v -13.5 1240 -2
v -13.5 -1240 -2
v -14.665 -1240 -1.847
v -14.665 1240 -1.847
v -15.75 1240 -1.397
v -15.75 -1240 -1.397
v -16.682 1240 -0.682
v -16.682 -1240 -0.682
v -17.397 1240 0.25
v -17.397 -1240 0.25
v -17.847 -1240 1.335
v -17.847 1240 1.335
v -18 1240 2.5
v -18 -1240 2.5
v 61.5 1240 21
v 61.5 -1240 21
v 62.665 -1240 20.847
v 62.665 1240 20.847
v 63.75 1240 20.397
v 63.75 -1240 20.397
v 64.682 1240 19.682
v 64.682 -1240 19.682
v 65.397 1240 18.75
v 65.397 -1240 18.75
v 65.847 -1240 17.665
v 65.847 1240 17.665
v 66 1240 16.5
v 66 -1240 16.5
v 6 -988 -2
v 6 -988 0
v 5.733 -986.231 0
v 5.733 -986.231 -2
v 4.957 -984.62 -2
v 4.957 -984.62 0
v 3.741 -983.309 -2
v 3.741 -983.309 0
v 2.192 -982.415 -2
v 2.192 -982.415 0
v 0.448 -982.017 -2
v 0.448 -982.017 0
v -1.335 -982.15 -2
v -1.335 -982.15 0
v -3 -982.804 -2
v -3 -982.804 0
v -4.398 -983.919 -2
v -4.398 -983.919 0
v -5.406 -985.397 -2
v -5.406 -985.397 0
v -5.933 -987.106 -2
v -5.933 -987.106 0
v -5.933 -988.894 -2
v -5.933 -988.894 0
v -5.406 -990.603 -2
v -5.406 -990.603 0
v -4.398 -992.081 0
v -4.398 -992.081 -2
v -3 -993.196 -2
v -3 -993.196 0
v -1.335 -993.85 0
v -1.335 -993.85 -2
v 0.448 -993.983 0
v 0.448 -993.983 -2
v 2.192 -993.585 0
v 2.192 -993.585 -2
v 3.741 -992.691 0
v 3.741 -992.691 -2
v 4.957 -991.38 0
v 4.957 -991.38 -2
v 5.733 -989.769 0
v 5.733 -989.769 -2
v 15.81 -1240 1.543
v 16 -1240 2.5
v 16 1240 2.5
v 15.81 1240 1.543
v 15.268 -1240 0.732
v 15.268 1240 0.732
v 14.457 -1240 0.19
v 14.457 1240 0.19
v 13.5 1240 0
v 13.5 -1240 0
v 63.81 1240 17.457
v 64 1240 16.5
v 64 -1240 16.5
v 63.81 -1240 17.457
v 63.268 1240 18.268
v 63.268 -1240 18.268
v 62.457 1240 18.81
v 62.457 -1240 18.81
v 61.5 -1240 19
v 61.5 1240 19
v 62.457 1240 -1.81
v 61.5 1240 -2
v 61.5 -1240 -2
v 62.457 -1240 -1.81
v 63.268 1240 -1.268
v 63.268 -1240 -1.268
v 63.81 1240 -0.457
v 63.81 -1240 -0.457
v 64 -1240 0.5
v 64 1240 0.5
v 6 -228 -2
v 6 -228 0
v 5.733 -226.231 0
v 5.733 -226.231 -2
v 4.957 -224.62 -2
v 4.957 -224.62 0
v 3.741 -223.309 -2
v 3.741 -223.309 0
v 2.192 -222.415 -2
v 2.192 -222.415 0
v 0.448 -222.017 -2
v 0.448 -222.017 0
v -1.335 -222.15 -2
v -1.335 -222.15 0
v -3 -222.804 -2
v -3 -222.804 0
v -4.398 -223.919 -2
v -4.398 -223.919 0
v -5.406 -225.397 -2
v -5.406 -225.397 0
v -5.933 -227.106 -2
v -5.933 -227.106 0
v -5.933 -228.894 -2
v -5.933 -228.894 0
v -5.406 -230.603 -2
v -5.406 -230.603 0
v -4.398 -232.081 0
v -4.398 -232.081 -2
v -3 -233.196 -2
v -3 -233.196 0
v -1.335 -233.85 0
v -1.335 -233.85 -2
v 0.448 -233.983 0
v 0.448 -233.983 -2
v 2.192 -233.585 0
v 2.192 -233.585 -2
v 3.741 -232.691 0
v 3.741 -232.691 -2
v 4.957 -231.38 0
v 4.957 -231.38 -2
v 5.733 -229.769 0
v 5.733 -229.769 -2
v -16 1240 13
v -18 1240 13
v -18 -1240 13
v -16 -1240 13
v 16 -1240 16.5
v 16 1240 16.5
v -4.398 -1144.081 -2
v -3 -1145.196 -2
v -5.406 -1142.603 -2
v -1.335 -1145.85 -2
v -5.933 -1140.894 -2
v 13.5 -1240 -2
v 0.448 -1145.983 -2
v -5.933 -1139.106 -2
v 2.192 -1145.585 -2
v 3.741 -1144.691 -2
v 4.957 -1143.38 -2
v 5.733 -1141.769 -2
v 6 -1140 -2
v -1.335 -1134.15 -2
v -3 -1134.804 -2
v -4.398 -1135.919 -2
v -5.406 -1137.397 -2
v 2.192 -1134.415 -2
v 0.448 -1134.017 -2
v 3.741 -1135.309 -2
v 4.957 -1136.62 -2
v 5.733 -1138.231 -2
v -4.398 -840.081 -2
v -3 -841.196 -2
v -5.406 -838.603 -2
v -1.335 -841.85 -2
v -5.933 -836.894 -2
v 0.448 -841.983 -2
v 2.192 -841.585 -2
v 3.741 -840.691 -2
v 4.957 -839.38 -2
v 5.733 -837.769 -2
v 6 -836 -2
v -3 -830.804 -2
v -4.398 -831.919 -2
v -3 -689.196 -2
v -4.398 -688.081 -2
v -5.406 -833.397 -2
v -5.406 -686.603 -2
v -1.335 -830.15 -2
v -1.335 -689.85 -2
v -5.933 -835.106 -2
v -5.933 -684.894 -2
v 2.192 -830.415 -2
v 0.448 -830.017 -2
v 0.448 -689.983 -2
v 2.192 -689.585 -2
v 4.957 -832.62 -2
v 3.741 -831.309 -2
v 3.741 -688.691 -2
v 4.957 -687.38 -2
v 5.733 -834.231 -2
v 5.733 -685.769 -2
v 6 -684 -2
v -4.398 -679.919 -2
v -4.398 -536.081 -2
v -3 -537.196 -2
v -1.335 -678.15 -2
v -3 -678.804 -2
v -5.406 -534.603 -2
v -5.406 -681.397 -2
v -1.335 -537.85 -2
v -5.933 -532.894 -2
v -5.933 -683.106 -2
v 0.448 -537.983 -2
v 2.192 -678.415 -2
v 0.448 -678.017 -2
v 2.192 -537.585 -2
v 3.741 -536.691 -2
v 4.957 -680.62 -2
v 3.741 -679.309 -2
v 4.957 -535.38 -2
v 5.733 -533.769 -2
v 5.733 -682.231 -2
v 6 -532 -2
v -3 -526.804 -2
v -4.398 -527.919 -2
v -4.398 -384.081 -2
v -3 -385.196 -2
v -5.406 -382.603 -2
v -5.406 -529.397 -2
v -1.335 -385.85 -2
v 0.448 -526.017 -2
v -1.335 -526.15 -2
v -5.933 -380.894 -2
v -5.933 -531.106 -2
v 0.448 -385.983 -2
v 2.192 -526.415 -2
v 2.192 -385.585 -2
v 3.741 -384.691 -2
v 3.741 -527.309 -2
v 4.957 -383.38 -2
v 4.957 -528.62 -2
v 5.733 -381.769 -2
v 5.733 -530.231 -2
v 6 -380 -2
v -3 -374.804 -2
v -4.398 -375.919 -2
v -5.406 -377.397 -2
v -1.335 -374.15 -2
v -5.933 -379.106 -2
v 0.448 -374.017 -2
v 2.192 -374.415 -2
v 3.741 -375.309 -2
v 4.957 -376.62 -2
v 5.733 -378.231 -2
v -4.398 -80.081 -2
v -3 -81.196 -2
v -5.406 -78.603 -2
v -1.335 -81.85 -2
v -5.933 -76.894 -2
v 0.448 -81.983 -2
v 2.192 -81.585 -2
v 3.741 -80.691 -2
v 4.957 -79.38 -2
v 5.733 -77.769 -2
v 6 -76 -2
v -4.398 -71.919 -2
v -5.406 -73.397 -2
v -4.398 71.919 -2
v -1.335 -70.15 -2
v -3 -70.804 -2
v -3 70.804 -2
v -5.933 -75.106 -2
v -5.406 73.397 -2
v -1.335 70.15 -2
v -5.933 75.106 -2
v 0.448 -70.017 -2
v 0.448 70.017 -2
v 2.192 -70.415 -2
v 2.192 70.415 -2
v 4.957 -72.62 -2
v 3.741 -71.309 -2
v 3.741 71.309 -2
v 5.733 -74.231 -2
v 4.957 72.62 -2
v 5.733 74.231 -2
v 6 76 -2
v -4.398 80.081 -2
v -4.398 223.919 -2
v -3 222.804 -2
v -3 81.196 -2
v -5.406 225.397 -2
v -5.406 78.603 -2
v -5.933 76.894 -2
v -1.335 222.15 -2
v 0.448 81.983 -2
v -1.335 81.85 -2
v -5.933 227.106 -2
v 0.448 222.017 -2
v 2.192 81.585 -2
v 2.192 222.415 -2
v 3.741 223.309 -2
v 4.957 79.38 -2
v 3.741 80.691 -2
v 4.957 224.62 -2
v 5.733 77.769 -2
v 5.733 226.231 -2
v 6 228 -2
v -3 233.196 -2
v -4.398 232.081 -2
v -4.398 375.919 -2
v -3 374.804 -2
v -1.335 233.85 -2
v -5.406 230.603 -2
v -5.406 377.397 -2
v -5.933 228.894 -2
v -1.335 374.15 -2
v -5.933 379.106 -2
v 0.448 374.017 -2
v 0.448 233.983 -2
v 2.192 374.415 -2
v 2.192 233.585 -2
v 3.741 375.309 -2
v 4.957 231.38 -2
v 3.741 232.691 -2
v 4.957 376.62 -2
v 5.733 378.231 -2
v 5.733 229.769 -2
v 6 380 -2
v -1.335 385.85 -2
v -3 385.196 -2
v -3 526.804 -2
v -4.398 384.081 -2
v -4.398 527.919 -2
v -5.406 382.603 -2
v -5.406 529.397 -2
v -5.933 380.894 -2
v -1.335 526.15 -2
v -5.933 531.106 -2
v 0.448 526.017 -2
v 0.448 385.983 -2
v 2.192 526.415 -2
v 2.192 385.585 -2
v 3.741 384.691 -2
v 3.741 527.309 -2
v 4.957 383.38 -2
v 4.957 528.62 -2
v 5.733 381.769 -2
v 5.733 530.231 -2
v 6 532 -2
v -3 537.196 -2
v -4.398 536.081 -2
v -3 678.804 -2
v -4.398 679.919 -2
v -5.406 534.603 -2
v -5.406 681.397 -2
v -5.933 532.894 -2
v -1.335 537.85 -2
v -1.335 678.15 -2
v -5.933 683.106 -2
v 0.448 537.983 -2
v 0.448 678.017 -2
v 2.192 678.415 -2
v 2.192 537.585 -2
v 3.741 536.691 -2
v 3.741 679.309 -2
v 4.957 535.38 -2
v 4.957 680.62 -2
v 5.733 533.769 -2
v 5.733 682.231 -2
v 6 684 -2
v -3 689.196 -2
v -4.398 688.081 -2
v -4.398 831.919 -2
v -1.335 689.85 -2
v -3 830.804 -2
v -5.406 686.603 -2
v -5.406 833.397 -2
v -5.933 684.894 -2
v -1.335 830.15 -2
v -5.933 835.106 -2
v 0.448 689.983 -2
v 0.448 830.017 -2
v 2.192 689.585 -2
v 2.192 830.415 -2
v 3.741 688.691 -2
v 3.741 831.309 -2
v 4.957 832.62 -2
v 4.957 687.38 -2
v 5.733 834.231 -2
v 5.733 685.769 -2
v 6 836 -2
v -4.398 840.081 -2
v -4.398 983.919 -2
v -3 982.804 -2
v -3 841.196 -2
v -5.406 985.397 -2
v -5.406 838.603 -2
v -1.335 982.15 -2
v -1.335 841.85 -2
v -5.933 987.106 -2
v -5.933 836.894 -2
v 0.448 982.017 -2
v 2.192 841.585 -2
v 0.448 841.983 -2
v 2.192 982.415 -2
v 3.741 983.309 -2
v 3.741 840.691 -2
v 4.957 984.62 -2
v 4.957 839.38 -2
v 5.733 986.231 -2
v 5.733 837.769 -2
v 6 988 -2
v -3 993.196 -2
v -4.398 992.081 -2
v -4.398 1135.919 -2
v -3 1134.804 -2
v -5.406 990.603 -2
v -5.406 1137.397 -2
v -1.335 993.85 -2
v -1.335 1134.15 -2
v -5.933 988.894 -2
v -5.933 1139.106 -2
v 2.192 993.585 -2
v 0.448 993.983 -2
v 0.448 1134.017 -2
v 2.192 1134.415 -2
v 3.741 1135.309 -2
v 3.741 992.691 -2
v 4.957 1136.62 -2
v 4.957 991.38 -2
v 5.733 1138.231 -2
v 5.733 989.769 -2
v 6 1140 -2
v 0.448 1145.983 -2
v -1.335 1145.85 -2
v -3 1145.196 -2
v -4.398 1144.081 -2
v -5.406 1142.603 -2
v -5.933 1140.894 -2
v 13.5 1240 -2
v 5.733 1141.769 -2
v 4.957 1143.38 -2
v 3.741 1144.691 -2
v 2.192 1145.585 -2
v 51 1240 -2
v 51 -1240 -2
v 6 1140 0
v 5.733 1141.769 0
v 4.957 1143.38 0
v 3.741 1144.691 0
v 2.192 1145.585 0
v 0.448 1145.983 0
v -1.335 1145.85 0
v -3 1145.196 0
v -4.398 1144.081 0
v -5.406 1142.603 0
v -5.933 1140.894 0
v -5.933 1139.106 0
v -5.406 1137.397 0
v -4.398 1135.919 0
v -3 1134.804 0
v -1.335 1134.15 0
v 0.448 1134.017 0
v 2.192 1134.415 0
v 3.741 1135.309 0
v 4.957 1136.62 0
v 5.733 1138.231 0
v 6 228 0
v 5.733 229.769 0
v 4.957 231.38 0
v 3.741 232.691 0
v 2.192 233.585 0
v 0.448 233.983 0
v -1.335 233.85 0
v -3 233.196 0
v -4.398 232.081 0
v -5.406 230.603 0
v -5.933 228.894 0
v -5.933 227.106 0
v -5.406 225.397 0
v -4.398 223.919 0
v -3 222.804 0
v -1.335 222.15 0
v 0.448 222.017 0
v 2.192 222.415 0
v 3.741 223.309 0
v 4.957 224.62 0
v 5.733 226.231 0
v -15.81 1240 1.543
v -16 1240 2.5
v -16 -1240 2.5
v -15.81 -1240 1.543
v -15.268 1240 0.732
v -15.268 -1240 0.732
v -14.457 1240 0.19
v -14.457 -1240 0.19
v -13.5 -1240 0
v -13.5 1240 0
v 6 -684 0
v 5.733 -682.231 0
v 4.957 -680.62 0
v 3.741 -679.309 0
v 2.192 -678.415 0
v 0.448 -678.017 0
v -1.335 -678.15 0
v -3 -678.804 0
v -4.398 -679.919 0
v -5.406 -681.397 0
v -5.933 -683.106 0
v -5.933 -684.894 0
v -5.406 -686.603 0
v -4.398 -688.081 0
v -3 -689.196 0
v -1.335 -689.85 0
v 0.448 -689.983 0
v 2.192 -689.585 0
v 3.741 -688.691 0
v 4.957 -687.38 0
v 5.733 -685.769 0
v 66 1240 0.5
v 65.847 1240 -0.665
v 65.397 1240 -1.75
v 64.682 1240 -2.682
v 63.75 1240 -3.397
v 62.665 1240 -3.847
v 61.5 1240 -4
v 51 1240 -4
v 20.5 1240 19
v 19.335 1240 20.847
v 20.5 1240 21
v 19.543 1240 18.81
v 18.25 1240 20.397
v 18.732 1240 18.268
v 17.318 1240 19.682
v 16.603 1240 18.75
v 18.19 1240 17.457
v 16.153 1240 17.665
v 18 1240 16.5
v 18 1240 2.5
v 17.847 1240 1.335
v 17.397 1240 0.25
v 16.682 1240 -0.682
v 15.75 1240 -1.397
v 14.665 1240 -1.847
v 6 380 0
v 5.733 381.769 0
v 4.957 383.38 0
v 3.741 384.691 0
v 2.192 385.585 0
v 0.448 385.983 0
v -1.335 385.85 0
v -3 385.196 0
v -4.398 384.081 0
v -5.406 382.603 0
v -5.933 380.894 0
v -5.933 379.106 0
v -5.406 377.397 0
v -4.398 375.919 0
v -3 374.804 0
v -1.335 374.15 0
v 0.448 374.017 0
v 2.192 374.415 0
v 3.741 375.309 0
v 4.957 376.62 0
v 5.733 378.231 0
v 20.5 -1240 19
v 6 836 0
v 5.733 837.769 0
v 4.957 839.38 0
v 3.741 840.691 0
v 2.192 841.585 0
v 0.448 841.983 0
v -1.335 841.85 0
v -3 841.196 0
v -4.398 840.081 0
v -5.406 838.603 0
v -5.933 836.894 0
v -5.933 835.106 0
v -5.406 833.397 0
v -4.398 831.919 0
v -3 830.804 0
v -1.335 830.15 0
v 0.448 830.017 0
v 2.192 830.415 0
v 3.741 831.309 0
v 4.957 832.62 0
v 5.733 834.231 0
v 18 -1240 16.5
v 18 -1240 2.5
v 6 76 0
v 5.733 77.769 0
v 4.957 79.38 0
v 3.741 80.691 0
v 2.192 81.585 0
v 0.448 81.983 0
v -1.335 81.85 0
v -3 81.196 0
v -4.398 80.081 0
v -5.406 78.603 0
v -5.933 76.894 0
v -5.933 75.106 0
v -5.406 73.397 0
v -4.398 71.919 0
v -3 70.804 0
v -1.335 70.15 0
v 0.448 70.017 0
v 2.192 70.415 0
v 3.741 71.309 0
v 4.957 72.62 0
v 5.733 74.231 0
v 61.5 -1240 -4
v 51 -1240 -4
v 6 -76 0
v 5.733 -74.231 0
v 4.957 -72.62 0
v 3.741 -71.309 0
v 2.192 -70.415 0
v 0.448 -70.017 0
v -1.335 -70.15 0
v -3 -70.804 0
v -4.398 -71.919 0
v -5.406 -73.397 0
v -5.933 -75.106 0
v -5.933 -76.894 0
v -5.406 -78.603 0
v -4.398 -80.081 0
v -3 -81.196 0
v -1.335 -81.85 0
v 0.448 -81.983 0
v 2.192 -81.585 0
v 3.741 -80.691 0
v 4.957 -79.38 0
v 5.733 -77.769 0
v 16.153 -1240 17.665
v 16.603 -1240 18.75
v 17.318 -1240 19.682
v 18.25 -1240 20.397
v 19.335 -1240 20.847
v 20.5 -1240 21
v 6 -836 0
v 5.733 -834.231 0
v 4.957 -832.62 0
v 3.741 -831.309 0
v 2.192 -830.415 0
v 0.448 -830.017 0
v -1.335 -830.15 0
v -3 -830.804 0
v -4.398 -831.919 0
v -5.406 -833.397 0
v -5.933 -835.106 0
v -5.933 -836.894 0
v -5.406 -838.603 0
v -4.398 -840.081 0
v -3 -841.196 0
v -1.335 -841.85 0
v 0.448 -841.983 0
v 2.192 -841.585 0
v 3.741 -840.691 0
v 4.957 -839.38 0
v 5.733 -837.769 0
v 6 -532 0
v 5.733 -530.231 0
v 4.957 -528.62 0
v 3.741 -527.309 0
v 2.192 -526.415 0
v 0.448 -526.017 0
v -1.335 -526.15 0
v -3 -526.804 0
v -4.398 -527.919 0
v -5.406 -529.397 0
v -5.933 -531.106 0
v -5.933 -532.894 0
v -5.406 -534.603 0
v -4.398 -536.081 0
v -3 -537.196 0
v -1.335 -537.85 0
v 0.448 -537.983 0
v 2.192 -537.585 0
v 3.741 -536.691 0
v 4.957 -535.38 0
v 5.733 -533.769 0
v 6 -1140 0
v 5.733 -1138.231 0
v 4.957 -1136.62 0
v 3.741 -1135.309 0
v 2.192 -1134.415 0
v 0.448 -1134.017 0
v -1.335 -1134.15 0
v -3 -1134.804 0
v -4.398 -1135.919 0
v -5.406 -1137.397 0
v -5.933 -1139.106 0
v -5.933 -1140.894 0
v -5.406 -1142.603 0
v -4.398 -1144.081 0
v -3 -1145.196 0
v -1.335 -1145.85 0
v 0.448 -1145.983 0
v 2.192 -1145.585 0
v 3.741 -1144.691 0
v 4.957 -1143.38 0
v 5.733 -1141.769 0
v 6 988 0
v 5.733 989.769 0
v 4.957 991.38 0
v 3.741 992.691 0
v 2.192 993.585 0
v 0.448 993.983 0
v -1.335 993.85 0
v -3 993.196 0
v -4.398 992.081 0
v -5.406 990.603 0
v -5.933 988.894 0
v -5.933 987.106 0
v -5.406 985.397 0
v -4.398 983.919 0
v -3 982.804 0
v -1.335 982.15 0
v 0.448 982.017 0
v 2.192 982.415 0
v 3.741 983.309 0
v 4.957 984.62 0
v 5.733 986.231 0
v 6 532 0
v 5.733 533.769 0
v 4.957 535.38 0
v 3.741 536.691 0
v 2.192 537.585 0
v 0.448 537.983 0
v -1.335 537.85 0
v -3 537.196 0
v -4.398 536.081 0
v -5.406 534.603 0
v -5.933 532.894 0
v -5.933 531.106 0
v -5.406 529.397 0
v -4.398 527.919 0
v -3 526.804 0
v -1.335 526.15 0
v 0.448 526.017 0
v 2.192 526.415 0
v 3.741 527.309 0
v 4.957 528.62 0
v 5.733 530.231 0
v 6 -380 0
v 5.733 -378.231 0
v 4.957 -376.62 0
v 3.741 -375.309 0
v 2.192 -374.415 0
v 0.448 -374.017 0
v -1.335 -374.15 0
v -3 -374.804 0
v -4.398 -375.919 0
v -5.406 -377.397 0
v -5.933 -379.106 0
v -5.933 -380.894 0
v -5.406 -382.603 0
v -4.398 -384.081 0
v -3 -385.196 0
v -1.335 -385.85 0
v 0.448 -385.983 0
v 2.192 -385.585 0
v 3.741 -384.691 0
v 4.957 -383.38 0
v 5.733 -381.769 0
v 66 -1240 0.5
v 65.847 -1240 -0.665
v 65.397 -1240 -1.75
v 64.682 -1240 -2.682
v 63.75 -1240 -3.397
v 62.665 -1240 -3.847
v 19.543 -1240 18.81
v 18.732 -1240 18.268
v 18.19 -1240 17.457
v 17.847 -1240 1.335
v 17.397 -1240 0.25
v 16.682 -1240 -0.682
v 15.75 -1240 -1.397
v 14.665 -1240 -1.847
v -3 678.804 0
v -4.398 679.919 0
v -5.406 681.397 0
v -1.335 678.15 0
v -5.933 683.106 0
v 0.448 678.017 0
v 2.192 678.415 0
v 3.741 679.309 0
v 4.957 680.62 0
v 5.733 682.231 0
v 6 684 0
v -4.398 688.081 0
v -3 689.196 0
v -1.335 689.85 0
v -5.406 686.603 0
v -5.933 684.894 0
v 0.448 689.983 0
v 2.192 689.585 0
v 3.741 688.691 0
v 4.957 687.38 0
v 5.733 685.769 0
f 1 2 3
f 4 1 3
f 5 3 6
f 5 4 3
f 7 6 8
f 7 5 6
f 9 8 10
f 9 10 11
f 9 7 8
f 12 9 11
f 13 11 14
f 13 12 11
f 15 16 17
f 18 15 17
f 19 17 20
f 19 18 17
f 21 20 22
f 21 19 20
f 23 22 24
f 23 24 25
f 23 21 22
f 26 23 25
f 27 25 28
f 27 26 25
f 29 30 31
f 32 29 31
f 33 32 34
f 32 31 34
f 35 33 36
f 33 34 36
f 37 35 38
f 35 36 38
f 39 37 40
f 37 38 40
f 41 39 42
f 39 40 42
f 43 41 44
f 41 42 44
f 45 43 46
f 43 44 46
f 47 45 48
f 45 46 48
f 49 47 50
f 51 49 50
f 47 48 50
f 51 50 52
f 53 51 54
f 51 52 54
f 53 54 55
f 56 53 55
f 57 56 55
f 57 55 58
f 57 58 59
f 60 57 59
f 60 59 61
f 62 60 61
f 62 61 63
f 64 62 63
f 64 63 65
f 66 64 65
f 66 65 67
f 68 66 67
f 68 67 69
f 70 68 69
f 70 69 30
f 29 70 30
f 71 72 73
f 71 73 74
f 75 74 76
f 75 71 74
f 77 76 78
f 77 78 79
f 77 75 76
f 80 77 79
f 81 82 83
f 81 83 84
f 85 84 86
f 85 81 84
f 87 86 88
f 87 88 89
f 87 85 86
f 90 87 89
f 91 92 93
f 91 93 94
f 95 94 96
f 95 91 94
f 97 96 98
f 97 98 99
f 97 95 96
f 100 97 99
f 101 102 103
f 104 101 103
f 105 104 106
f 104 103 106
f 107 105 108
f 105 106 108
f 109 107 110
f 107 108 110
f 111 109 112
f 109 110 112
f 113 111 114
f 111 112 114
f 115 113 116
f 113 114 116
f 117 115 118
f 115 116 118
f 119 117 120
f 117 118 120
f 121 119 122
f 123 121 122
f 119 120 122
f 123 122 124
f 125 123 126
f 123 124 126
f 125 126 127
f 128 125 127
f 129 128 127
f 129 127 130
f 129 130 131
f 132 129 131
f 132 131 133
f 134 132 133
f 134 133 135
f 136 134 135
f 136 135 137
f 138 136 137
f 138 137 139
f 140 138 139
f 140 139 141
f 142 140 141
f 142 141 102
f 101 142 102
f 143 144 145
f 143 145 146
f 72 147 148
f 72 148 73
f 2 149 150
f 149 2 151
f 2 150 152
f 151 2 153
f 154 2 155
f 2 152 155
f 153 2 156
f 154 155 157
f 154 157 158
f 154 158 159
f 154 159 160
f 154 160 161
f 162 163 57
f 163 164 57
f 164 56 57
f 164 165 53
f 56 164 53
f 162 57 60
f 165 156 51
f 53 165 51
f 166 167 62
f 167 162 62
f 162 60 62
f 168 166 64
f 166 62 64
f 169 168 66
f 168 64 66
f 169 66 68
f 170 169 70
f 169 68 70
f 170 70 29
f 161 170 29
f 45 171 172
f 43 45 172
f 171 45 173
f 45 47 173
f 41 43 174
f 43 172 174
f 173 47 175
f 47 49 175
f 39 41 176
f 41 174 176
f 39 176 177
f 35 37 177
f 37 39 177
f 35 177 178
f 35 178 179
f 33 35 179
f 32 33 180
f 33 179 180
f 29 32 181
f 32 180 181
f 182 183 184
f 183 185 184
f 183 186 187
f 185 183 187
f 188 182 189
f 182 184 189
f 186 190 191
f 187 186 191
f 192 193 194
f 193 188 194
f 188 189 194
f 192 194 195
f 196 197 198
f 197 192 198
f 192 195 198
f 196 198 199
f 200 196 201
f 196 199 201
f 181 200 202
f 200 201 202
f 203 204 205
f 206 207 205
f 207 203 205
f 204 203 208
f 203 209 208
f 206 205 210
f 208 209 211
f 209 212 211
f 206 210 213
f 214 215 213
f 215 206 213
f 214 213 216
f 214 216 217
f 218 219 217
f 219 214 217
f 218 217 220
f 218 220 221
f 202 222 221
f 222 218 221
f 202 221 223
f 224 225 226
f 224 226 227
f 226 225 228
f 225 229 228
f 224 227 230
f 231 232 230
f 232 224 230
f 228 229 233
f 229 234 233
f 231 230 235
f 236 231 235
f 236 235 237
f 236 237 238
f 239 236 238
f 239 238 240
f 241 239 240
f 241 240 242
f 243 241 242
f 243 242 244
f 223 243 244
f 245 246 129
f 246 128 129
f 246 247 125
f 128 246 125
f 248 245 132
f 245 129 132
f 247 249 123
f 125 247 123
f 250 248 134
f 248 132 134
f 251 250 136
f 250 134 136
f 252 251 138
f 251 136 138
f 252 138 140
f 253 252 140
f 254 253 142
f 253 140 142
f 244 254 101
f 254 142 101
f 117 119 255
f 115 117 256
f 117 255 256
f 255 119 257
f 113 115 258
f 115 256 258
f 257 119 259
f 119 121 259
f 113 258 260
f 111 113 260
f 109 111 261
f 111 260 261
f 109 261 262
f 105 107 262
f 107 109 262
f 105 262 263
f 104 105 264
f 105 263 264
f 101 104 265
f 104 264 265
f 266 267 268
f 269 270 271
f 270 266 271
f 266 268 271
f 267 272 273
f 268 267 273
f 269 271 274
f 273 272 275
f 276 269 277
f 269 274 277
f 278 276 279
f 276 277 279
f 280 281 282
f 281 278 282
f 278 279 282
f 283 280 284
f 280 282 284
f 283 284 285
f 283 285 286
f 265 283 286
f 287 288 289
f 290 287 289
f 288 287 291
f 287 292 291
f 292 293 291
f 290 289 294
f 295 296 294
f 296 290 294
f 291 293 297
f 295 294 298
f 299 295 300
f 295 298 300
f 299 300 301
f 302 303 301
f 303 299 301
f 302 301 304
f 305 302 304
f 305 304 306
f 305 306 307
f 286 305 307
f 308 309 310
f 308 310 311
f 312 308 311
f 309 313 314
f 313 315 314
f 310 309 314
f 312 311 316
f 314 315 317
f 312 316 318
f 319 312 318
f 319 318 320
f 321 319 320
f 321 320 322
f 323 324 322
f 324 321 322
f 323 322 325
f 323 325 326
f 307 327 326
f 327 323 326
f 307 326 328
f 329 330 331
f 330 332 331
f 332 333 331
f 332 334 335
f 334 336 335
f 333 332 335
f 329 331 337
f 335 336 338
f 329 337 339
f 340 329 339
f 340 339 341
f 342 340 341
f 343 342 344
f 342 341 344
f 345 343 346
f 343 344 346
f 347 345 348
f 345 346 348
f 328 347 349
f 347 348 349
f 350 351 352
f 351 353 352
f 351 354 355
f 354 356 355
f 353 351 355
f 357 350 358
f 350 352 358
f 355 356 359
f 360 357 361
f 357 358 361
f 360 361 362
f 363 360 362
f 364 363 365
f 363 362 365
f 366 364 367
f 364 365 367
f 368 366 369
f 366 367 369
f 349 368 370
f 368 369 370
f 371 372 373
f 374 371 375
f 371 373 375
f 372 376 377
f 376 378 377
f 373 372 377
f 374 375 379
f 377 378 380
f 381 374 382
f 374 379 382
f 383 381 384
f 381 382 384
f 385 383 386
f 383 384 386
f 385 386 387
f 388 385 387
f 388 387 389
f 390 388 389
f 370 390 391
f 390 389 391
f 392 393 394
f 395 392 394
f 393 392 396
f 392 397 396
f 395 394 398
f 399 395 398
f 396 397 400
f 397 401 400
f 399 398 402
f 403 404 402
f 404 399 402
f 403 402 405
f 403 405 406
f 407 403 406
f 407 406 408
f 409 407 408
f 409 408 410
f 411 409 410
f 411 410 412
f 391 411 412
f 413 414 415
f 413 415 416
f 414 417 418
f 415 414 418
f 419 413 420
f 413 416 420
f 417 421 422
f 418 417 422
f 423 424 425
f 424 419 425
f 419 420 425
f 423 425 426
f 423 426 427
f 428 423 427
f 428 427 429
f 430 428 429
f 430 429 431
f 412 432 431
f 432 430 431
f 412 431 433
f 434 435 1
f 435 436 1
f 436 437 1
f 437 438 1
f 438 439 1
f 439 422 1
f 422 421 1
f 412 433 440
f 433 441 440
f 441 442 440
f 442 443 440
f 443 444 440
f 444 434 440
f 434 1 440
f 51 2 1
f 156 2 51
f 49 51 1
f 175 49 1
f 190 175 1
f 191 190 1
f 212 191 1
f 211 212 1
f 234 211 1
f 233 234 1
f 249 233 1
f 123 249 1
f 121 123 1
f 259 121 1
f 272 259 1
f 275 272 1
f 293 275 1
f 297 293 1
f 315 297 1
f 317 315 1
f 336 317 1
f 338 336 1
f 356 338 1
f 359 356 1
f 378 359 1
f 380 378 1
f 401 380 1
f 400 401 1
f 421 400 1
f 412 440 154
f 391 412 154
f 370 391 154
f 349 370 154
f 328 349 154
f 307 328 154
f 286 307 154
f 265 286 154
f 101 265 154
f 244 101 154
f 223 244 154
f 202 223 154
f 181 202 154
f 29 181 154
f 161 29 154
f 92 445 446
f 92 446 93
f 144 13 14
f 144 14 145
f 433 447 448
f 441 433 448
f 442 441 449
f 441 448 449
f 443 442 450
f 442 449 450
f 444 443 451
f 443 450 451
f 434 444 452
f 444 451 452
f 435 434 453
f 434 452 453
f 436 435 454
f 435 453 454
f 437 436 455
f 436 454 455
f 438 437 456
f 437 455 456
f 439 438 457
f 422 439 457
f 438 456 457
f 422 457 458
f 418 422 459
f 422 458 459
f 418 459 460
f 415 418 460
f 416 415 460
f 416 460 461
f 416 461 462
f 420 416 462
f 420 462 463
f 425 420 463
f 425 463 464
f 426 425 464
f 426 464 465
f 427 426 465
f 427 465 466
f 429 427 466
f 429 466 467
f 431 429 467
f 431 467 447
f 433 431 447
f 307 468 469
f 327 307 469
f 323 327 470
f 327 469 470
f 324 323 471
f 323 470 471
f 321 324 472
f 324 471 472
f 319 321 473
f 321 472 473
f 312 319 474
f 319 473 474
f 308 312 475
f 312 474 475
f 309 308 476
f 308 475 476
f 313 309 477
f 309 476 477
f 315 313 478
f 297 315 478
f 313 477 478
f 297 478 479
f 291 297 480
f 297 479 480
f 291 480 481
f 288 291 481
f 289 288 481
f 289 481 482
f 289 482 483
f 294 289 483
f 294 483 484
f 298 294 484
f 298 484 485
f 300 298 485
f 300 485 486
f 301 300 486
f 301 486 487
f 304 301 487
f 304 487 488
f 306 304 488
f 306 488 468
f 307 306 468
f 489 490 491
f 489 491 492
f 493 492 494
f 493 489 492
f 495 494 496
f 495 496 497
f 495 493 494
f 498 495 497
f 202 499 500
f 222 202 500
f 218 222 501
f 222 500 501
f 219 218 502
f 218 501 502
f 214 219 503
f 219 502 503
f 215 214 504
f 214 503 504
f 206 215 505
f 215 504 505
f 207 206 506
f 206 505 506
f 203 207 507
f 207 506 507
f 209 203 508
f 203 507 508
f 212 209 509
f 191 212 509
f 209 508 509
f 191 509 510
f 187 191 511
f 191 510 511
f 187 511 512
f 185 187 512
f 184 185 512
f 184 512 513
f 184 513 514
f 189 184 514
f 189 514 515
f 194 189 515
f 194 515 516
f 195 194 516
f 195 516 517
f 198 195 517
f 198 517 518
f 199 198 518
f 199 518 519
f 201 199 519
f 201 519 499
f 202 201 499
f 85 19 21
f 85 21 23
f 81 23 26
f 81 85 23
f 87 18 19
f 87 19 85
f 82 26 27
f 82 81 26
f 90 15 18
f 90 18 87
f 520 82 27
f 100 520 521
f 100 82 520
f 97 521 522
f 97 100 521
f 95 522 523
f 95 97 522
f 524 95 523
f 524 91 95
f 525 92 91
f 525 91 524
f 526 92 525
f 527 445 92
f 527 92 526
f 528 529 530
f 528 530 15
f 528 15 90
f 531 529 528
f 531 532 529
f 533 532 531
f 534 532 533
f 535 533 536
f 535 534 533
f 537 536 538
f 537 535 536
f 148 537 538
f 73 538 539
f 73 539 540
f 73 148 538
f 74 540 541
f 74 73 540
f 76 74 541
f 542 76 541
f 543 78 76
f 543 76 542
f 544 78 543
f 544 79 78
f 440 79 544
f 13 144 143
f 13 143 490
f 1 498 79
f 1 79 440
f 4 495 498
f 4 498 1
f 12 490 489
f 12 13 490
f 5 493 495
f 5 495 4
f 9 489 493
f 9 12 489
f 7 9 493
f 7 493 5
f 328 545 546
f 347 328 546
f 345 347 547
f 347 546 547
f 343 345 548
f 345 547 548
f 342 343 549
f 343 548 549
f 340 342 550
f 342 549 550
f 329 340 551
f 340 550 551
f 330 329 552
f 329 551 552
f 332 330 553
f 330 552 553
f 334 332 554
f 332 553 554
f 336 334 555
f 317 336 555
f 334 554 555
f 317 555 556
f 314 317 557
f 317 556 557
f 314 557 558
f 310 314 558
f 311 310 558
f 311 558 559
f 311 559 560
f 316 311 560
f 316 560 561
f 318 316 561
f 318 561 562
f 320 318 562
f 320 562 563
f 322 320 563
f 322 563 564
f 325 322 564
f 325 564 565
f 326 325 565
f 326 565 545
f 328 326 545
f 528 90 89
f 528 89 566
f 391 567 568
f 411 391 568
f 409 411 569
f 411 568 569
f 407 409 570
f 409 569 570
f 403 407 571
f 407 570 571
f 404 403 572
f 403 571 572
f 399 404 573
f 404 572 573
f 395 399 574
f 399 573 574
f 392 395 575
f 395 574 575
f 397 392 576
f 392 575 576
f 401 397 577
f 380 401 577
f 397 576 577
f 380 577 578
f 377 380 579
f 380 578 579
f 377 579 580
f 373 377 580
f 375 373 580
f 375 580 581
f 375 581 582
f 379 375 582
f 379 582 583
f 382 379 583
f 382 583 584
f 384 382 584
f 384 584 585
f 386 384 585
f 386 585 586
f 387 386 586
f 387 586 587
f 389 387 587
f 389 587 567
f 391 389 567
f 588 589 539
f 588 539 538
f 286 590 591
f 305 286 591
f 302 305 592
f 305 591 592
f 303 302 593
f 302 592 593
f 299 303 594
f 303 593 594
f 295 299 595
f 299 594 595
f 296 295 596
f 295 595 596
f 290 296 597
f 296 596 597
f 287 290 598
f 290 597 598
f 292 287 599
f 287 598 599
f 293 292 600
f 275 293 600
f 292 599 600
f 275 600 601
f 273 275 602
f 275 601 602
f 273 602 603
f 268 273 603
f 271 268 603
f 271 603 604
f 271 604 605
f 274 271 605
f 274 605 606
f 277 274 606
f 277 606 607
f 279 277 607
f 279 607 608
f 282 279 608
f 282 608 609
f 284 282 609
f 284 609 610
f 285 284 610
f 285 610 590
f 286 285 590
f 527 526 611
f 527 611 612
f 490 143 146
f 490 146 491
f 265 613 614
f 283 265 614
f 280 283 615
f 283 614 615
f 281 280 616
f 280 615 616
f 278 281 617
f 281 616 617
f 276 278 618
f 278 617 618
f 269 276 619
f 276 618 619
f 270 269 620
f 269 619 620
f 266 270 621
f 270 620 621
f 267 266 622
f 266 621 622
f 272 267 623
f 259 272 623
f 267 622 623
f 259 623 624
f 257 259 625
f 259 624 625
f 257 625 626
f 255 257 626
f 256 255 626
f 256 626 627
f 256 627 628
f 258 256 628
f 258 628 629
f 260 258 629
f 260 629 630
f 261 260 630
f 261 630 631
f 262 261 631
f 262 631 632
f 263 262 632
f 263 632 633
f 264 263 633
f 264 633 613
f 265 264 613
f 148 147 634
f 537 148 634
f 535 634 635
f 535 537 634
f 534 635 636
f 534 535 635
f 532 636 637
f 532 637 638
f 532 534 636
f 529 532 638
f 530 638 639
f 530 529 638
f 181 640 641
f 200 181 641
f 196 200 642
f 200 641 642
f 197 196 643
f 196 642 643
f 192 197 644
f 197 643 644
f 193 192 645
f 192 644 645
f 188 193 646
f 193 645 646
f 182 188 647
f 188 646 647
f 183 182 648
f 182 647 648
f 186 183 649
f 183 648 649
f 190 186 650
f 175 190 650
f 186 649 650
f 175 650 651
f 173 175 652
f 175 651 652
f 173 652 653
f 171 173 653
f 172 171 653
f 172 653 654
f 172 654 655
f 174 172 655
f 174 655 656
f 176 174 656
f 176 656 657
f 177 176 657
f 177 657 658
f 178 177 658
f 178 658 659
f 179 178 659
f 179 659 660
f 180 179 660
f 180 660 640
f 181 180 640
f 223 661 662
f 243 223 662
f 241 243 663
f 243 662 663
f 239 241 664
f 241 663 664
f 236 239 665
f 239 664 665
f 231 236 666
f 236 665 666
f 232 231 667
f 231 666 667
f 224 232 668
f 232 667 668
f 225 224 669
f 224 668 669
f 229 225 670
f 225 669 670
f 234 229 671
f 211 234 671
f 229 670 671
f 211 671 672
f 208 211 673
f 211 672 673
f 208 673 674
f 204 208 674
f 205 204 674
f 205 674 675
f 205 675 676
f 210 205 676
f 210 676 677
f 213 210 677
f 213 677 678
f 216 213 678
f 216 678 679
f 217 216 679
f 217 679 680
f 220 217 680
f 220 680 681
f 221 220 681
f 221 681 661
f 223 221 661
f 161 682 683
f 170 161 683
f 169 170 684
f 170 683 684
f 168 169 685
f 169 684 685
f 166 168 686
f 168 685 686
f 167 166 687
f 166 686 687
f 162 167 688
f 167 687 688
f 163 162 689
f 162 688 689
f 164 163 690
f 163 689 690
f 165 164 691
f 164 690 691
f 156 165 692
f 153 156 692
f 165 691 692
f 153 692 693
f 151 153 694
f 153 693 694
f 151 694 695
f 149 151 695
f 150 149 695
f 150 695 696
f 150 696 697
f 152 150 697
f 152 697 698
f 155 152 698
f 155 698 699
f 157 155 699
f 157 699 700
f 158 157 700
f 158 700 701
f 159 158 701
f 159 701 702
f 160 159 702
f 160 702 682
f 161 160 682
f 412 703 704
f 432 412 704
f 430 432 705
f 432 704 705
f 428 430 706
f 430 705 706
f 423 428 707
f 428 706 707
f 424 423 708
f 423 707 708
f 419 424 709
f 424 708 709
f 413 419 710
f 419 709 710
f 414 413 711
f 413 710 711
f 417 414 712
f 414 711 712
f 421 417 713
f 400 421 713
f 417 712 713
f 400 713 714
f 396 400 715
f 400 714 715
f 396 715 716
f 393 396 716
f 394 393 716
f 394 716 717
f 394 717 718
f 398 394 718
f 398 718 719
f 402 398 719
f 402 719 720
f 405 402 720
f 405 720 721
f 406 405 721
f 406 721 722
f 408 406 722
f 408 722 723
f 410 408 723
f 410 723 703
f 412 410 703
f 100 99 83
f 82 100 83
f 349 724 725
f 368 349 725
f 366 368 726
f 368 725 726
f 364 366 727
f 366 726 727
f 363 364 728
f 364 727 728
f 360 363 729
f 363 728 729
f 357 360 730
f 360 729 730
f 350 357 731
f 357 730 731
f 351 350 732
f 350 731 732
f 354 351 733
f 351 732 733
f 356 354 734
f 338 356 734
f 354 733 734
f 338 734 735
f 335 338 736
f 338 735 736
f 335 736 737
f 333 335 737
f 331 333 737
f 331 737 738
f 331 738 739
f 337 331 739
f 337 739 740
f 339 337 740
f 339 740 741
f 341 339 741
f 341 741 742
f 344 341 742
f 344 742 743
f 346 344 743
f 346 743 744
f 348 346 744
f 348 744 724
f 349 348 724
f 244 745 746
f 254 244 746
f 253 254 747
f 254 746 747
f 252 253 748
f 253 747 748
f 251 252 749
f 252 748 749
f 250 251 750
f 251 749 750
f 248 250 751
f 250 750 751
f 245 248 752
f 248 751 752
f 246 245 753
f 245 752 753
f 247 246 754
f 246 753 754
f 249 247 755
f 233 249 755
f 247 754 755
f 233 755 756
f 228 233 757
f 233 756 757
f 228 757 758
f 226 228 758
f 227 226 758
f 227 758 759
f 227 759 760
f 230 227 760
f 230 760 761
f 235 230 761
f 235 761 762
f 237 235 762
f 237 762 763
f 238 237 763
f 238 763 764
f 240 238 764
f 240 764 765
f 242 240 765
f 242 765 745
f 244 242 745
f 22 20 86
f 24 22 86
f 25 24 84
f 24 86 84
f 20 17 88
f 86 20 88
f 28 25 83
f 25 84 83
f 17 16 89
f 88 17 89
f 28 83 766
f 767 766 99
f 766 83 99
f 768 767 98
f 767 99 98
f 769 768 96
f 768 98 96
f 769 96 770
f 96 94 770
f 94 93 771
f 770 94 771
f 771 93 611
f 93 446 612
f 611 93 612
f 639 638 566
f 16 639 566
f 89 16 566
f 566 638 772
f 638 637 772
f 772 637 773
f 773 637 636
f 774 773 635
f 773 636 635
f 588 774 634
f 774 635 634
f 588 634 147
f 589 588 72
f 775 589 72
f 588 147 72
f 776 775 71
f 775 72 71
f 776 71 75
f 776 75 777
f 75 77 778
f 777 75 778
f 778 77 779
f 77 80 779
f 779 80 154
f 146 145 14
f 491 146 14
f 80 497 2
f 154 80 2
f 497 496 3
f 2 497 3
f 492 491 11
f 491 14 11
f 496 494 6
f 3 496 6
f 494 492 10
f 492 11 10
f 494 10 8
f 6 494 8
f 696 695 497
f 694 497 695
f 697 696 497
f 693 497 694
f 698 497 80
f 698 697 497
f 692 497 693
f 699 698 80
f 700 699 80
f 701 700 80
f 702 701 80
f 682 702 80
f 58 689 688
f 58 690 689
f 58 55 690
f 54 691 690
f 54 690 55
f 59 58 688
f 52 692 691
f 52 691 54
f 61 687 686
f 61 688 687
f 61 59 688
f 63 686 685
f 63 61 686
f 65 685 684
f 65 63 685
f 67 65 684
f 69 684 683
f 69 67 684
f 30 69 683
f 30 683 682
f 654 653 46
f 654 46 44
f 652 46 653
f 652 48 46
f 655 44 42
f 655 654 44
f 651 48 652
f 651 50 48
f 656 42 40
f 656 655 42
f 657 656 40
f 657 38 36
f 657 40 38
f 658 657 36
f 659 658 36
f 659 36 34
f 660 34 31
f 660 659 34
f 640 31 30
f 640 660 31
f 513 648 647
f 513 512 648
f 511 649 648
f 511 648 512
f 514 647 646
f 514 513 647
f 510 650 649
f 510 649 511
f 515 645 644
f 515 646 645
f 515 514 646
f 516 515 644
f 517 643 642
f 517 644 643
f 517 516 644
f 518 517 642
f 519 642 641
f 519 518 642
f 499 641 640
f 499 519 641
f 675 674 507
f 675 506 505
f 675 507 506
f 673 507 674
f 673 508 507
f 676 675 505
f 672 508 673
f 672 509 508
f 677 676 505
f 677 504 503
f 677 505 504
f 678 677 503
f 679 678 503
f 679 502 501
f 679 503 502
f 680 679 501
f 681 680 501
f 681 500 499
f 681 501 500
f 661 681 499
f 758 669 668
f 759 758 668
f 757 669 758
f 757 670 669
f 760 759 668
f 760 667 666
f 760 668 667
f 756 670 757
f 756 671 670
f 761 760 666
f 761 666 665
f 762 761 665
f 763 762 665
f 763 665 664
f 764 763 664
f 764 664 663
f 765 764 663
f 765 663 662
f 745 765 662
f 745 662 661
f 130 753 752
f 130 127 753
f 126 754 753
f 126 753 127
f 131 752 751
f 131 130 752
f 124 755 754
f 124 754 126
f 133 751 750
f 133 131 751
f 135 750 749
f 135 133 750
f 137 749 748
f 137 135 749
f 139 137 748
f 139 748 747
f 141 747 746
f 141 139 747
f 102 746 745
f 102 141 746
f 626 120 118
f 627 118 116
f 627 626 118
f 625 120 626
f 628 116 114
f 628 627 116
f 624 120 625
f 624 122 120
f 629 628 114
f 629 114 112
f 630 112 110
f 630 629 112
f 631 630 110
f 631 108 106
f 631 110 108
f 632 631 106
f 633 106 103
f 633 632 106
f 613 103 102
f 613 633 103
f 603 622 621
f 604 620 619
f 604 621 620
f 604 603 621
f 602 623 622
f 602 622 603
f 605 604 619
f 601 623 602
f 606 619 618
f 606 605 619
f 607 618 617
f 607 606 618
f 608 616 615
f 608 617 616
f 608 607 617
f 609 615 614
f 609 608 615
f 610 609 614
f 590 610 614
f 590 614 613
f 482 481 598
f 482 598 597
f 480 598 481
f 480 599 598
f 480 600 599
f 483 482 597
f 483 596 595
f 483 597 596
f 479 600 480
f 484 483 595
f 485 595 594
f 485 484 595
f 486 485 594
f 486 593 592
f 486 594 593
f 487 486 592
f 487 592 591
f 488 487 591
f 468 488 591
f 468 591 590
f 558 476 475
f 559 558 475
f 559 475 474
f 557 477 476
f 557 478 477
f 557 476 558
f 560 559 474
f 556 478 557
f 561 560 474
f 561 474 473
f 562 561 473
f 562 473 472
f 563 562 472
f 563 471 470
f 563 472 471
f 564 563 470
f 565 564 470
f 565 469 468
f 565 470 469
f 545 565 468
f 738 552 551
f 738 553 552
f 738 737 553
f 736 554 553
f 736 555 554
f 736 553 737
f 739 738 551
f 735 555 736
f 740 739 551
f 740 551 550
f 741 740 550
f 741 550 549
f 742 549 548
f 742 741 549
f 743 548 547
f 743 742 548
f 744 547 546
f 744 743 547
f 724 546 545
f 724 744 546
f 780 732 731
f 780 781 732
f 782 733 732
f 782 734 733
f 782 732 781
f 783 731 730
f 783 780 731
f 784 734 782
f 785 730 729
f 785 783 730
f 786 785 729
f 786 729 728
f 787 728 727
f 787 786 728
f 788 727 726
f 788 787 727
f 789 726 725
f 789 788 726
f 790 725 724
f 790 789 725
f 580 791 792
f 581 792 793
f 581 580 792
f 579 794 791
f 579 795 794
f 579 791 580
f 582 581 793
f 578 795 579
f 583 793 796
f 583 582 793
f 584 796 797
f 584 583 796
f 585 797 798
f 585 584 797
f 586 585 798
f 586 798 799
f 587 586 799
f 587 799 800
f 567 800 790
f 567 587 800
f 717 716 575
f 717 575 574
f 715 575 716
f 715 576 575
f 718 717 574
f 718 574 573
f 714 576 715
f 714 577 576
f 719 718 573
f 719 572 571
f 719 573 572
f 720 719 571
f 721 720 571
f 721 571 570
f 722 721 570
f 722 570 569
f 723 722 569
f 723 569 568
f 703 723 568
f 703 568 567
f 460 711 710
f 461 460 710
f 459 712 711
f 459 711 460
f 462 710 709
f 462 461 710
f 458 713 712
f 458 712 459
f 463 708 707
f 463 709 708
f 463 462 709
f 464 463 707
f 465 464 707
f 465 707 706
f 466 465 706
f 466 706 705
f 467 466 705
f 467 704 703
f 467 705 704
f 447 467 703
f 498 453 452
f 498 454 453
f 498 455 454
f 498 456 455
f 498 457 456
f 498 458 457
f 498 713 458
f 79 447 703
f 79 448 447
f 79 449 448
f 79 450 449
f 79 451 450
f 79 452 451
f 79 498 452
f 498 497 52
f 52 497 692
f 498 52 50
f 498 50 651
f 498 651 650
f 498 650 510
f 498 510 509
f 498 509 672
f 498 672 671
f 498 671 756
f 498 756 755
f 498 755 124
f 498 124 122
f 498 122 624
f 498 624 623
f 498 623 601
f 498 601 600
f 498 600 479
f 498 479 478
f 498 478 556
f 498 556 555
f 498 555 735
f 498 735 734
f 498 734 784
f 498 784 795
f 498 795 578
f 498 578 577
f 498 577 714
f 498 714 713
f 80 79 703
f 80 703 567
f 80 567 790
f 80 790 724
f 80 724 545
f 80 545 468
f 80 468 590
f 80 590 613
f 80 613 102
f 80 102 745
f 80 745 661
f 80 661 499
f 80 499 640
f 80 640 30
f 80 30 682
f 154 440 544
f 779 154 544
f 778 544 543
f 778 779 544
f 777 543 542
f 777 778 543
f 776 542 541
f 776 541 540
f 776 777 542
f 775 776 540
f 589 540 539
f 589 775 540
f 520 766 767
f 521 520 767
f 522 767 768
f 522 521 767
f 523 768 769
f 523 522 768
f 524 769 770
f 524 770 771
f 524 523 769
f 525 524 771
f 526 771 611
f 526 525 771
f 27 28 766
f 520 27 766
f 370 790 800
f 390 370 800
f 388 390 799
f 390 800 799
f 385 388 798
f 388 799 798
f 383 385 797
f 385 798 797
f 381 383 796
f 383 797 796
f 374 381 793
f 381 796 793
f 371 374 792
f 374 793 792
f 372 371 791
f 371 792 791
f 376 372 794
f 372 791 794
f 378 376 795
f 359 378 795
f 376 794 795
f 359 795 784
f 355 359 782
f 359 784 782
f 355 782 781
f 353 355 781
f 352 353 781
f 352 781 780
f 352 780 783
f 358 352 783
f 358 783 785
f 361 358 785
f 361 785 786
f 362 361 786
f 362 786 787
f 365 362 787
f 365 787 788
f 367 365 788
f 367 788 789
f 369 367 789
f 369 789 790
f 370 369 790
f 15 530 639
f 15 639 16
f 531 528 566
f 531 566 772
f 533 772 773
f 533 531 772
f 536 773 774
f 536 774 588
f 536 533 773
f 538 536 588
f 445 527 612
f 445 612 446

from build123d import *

# Parameters (mm, degrees)
SKETCH1_W                    = 36
SKETCH1_H                    = 2480
BASE_FLANGE1_DEPTH           = 2
EDGE_FLANGE1_STRIP_W         = 13
EDGE_FLANGE1_STRIP_H         = 2
EDGE_FLANGE1_STRIP_CUT_DEPTH = 2480
EDGE_FLANGE1_DEPTH           = 2480
EDGE_FLANGE2_STRIP_W         = 13
EDGE_FLANGE2_STRIP_H         = 2
EDGE_FLANGE2_STRIP_CUT_DEPTH = 2480
EDGE_FLANGE2_DEPTH           = 2480
EDGE_FLANGE3_STRIP_W         = 13
EDGE_FLANGE3_STRIP_H         = 2
EDGE_FLANGE3_STRIP_CUT_DEPTH = 2480
EDGE_FLANGE3_DEPTH           = 2480
EDGE_FLANGE4_STRIP_W         = 13
EDGE_FLANGE4_STRIP_H         = 2
EDGE_FLANGE4_STRIP_CUT_DEPTH = 2480
EDGE_FLANGE4_DEPTH           = 2480
EDGE_FLANGE5_STRIP_W         = 13
EDGE_FLANGE5_STRIP_H         = 2
EDGE_FLANGE5_STRIP_CUT_DEPTH = 2480
EDGE_FLANGE5_DEPTH           = 2480
SKETCH21_R                   = 6
CUT_EXTRUDE1_DEPTH           = 10
LPATTERN1_COUNT              = 16
LPATTERN1_PITCH              = 152


# Sheet-metal steps are written as plain solids
with BuildPart() as part:
    # Sketch1 → Base-Flange1 (new body)
    with BuildSketch(Plane.XY):
        Rectangle(SKETCH1_W, SKETCH1_H)
    extrude(amount=-BASE_FLANGE1_DEPTH)

    # Edge-Flange1 strip (across the edge) → Edge-Flange1 strip cut (cut)
    with BuildSketch(Plane(origin=(-18, 1240, 0), x_dir=(1, 0, 0), z_dir=(0, -1, 0))):
        with Locations((-2, -1)):
            Rectangle(EDGE_FLANGE1_STRIP_W, EDGE_FLANGE1_STRIP_H)
    extrude(amount=EDGE_FLANGE1_STRIP_CUT_DEPTH, mode=Mode.SUBTRACT)

    # Edge-Flange1 section (across the edge) → Edge-Flange1 (add)
    with BuildSketch(Plane(origin=(-18, 1240, 0), x_dir=(1, 0, 0), z_dir=(0, -1, 0))):
        with BuildLine():
            Line((0, 2.5), (0, 13))
            Line((0, 13), (2, 13))
            Line((2, 13), (2, 2.5))
            ThreePointArc((2, 2.5), (2.732233047, 0.732233047), (4.5, 0))
            Line((4.5, 0), (4.5, -2))
            ThreePointArc((4.5, -2), (1.318019485, -0.681980515), (0, 2.5))
        make_face()
    extrude(amount=EDGE_FLANGE1_DEPTH)

    # Edge-Flange2 strip (across the edge) → Edge-Flange2 strip cut (cut)
    with BuildSketch(Plane(origin=(18, -1240, 0), x_dir=(-1, 0, 0), z_dir=(0, 1, 0))):
        with Locations((-2, -1)):
            Rectangle(EDGE_FLANGE2_STRIP_W, EDGE_FLANGE2_STRIP_H)
    extrude(amount=EDGE_FLANGE2_STRIP_CUT_DEPTH, mode=Mode.SUBTRACT)

    # Edge-Flange2 section (across the edge) → Edge-Flange2 (add)
    with BuildSketch(Plane(origin=(18, -1240, 0), x_dir=(-1, 0, 0), z_dir=(0, 1, 0))):
        with BuildLine():
            Line((0, 2.5), (0, 21))
            Line((0, 21), (2, 21))
            Line((2, 21), (2, 2.5))
            ThreePointArc((2, 2.5), (2.732233047, 0.732233047), (4.5, 0))
            Line((4.5, 0), (4.5, -2))
            ThreePointArc((4.5, -2), (1.318019485, -0.681980515), (0, 2.5))
        make_face()
    extrude(amount=EDGE_FLANGE2_DEPTH)

    # Edge-Flange3 strip (across the edge) → Edge-Flange3 strip cut (cut)
    with BuildSketch(Plane(origin=(18, 1240, 21), x_dir=(0, 0, -1), z_dir=(0, -1, 0))):
        with Locations((-2, -1)):
            Rectangle(EDGE_FLANGE3_STRIP_W, EDGE_FLANGE3_STRIP_H)
    extrude(amount=EDGE_FLANGE3_STRIP_CUT_DEPTH, mode=Mode.SUBTRACT)

    # Edge-Flange3 section (across the edge) → Edge-Flange3 (add)
    with BuildSketch(Plane(origin=(18, 1240, 21), x_dir=(0, 0, -1), z_dir=(0, -1, 0))):
        with BuildLine():
            Line((0, 2.5), (0, 48))
            Line((0, 48), (2, 48))
            Line((2, 48), (2, 2.5))
            ThreePointArc((2, 2.5), (2.732233047, 0.732233047), (4.5, 0))
            Line((4.5, 0), (4.5, -2))
            ThreePointArc((4.5, -2), (1.318019485, -0.681980515), (0, 2.5))
        make_face()
    extrude(amount=EDGE_FLANGE3_DEPTH)

    # Edge-Flange4 strip (across the edge) → Edge-Flange4 strip cut (cut)
    with BuildSketch(Plane(origin=(66, 1240, 19), x_dir=(-1, 0, 0), z_dir=(0, -1, 0))):
        with Locations((-2, -1)):
            Rectangle(EDGE_FLANGE4_STRIP_W, EDGE_FLANGE4_STRIP_H)
    extrude(amount=EDGE_FLANGE4_STRIP_CUT_DEPTH, mode=Mode.SUBTRACT)

    # Edge-Flange4 section (across the edge) → Edge-Flange4 (add)
    with BuildSketch(Plane(origin=(66, 1240, 19), x_dir=(-1, 0, 0), z_dir=(0, -1, 0))):
        with BuildLine():
            Line((0, 2.5), (0, 23))
            Line((0, 23), (2, 23))
            Line((2, 23), (2, 2.5))
            ThreePointArc((2, 2.5), (2.732233047, 0.732233047), (4.5, 0))
            Line((4.5, 0), (4.5, -2))
            ThreePointArc((4.5, -2), (1.318019485, -0.681980515), (0, 2.5))
        make_face()
    extrude(amount=EDGE_FLANGE4_DEPTH)

    # Edge-Flange5 strip (across the edge) → Edge-Flange5 strip cut (cut)
    with BuildSketch(Plane(origin=(64, 1240, -4), x_dir=(0, 0, 1), z_dir=(0, -1, 0))):
        with Locations((-2, -1)):
            Rectangle(EDGE_FLANGE5_STRIP_W, EDGE_FLANGE5_STRIP_H)
    extrude(amount=EDGE_FLANGE5_STRIP_CUT_DEPTH, mode=Mode.SUBTRACT)

    # Edge-Flange5 section (across the edge) → Edge-Flange5 (add)
    with BuildSketch(Plane(origin=(64, 1240, -4), x_dir=(0, 0, 1), z_dir=(0, -1, 0))):
        with BuildLine():
            Line((0, 2.5), (0, 13))
            Line((0, 13), (2, 13))
            Line((2, 13), (2, 2.5))
            ThreePointArc((2, 2.5), (2.732233047, 0.732233047), (4.5, 0))
            Line((4.5, 0), (4.5, -2))
            ThreePointArc((4.5, -2), (1.318019485, -0.681980515), (0, 2.5))
        make_face()
    extrude(amount=EDGE_FLANGE5_DEPTH)

    # Sketch21 → Cut-Extrude1 (cut)
    with BuildSketch(Plane.XY):
        with Locations((0, 1140)):
            Circle(SKETCH21_R)
    cut_extrude1 = extrude(amount=-CUT_EXTRUDE1_DEPTH, mode=Mode.SUBTRACT)

    # LPattern1: Cut-Extrude1 ×16
    with Locations(*[(0, -i * LPATTERN1_PITCH, 0) for i in range(1, LPATTERN1_COUNT)]):
        add(cut_extrude1, mode=Mode.SUBTRACT)


solid = part.part
